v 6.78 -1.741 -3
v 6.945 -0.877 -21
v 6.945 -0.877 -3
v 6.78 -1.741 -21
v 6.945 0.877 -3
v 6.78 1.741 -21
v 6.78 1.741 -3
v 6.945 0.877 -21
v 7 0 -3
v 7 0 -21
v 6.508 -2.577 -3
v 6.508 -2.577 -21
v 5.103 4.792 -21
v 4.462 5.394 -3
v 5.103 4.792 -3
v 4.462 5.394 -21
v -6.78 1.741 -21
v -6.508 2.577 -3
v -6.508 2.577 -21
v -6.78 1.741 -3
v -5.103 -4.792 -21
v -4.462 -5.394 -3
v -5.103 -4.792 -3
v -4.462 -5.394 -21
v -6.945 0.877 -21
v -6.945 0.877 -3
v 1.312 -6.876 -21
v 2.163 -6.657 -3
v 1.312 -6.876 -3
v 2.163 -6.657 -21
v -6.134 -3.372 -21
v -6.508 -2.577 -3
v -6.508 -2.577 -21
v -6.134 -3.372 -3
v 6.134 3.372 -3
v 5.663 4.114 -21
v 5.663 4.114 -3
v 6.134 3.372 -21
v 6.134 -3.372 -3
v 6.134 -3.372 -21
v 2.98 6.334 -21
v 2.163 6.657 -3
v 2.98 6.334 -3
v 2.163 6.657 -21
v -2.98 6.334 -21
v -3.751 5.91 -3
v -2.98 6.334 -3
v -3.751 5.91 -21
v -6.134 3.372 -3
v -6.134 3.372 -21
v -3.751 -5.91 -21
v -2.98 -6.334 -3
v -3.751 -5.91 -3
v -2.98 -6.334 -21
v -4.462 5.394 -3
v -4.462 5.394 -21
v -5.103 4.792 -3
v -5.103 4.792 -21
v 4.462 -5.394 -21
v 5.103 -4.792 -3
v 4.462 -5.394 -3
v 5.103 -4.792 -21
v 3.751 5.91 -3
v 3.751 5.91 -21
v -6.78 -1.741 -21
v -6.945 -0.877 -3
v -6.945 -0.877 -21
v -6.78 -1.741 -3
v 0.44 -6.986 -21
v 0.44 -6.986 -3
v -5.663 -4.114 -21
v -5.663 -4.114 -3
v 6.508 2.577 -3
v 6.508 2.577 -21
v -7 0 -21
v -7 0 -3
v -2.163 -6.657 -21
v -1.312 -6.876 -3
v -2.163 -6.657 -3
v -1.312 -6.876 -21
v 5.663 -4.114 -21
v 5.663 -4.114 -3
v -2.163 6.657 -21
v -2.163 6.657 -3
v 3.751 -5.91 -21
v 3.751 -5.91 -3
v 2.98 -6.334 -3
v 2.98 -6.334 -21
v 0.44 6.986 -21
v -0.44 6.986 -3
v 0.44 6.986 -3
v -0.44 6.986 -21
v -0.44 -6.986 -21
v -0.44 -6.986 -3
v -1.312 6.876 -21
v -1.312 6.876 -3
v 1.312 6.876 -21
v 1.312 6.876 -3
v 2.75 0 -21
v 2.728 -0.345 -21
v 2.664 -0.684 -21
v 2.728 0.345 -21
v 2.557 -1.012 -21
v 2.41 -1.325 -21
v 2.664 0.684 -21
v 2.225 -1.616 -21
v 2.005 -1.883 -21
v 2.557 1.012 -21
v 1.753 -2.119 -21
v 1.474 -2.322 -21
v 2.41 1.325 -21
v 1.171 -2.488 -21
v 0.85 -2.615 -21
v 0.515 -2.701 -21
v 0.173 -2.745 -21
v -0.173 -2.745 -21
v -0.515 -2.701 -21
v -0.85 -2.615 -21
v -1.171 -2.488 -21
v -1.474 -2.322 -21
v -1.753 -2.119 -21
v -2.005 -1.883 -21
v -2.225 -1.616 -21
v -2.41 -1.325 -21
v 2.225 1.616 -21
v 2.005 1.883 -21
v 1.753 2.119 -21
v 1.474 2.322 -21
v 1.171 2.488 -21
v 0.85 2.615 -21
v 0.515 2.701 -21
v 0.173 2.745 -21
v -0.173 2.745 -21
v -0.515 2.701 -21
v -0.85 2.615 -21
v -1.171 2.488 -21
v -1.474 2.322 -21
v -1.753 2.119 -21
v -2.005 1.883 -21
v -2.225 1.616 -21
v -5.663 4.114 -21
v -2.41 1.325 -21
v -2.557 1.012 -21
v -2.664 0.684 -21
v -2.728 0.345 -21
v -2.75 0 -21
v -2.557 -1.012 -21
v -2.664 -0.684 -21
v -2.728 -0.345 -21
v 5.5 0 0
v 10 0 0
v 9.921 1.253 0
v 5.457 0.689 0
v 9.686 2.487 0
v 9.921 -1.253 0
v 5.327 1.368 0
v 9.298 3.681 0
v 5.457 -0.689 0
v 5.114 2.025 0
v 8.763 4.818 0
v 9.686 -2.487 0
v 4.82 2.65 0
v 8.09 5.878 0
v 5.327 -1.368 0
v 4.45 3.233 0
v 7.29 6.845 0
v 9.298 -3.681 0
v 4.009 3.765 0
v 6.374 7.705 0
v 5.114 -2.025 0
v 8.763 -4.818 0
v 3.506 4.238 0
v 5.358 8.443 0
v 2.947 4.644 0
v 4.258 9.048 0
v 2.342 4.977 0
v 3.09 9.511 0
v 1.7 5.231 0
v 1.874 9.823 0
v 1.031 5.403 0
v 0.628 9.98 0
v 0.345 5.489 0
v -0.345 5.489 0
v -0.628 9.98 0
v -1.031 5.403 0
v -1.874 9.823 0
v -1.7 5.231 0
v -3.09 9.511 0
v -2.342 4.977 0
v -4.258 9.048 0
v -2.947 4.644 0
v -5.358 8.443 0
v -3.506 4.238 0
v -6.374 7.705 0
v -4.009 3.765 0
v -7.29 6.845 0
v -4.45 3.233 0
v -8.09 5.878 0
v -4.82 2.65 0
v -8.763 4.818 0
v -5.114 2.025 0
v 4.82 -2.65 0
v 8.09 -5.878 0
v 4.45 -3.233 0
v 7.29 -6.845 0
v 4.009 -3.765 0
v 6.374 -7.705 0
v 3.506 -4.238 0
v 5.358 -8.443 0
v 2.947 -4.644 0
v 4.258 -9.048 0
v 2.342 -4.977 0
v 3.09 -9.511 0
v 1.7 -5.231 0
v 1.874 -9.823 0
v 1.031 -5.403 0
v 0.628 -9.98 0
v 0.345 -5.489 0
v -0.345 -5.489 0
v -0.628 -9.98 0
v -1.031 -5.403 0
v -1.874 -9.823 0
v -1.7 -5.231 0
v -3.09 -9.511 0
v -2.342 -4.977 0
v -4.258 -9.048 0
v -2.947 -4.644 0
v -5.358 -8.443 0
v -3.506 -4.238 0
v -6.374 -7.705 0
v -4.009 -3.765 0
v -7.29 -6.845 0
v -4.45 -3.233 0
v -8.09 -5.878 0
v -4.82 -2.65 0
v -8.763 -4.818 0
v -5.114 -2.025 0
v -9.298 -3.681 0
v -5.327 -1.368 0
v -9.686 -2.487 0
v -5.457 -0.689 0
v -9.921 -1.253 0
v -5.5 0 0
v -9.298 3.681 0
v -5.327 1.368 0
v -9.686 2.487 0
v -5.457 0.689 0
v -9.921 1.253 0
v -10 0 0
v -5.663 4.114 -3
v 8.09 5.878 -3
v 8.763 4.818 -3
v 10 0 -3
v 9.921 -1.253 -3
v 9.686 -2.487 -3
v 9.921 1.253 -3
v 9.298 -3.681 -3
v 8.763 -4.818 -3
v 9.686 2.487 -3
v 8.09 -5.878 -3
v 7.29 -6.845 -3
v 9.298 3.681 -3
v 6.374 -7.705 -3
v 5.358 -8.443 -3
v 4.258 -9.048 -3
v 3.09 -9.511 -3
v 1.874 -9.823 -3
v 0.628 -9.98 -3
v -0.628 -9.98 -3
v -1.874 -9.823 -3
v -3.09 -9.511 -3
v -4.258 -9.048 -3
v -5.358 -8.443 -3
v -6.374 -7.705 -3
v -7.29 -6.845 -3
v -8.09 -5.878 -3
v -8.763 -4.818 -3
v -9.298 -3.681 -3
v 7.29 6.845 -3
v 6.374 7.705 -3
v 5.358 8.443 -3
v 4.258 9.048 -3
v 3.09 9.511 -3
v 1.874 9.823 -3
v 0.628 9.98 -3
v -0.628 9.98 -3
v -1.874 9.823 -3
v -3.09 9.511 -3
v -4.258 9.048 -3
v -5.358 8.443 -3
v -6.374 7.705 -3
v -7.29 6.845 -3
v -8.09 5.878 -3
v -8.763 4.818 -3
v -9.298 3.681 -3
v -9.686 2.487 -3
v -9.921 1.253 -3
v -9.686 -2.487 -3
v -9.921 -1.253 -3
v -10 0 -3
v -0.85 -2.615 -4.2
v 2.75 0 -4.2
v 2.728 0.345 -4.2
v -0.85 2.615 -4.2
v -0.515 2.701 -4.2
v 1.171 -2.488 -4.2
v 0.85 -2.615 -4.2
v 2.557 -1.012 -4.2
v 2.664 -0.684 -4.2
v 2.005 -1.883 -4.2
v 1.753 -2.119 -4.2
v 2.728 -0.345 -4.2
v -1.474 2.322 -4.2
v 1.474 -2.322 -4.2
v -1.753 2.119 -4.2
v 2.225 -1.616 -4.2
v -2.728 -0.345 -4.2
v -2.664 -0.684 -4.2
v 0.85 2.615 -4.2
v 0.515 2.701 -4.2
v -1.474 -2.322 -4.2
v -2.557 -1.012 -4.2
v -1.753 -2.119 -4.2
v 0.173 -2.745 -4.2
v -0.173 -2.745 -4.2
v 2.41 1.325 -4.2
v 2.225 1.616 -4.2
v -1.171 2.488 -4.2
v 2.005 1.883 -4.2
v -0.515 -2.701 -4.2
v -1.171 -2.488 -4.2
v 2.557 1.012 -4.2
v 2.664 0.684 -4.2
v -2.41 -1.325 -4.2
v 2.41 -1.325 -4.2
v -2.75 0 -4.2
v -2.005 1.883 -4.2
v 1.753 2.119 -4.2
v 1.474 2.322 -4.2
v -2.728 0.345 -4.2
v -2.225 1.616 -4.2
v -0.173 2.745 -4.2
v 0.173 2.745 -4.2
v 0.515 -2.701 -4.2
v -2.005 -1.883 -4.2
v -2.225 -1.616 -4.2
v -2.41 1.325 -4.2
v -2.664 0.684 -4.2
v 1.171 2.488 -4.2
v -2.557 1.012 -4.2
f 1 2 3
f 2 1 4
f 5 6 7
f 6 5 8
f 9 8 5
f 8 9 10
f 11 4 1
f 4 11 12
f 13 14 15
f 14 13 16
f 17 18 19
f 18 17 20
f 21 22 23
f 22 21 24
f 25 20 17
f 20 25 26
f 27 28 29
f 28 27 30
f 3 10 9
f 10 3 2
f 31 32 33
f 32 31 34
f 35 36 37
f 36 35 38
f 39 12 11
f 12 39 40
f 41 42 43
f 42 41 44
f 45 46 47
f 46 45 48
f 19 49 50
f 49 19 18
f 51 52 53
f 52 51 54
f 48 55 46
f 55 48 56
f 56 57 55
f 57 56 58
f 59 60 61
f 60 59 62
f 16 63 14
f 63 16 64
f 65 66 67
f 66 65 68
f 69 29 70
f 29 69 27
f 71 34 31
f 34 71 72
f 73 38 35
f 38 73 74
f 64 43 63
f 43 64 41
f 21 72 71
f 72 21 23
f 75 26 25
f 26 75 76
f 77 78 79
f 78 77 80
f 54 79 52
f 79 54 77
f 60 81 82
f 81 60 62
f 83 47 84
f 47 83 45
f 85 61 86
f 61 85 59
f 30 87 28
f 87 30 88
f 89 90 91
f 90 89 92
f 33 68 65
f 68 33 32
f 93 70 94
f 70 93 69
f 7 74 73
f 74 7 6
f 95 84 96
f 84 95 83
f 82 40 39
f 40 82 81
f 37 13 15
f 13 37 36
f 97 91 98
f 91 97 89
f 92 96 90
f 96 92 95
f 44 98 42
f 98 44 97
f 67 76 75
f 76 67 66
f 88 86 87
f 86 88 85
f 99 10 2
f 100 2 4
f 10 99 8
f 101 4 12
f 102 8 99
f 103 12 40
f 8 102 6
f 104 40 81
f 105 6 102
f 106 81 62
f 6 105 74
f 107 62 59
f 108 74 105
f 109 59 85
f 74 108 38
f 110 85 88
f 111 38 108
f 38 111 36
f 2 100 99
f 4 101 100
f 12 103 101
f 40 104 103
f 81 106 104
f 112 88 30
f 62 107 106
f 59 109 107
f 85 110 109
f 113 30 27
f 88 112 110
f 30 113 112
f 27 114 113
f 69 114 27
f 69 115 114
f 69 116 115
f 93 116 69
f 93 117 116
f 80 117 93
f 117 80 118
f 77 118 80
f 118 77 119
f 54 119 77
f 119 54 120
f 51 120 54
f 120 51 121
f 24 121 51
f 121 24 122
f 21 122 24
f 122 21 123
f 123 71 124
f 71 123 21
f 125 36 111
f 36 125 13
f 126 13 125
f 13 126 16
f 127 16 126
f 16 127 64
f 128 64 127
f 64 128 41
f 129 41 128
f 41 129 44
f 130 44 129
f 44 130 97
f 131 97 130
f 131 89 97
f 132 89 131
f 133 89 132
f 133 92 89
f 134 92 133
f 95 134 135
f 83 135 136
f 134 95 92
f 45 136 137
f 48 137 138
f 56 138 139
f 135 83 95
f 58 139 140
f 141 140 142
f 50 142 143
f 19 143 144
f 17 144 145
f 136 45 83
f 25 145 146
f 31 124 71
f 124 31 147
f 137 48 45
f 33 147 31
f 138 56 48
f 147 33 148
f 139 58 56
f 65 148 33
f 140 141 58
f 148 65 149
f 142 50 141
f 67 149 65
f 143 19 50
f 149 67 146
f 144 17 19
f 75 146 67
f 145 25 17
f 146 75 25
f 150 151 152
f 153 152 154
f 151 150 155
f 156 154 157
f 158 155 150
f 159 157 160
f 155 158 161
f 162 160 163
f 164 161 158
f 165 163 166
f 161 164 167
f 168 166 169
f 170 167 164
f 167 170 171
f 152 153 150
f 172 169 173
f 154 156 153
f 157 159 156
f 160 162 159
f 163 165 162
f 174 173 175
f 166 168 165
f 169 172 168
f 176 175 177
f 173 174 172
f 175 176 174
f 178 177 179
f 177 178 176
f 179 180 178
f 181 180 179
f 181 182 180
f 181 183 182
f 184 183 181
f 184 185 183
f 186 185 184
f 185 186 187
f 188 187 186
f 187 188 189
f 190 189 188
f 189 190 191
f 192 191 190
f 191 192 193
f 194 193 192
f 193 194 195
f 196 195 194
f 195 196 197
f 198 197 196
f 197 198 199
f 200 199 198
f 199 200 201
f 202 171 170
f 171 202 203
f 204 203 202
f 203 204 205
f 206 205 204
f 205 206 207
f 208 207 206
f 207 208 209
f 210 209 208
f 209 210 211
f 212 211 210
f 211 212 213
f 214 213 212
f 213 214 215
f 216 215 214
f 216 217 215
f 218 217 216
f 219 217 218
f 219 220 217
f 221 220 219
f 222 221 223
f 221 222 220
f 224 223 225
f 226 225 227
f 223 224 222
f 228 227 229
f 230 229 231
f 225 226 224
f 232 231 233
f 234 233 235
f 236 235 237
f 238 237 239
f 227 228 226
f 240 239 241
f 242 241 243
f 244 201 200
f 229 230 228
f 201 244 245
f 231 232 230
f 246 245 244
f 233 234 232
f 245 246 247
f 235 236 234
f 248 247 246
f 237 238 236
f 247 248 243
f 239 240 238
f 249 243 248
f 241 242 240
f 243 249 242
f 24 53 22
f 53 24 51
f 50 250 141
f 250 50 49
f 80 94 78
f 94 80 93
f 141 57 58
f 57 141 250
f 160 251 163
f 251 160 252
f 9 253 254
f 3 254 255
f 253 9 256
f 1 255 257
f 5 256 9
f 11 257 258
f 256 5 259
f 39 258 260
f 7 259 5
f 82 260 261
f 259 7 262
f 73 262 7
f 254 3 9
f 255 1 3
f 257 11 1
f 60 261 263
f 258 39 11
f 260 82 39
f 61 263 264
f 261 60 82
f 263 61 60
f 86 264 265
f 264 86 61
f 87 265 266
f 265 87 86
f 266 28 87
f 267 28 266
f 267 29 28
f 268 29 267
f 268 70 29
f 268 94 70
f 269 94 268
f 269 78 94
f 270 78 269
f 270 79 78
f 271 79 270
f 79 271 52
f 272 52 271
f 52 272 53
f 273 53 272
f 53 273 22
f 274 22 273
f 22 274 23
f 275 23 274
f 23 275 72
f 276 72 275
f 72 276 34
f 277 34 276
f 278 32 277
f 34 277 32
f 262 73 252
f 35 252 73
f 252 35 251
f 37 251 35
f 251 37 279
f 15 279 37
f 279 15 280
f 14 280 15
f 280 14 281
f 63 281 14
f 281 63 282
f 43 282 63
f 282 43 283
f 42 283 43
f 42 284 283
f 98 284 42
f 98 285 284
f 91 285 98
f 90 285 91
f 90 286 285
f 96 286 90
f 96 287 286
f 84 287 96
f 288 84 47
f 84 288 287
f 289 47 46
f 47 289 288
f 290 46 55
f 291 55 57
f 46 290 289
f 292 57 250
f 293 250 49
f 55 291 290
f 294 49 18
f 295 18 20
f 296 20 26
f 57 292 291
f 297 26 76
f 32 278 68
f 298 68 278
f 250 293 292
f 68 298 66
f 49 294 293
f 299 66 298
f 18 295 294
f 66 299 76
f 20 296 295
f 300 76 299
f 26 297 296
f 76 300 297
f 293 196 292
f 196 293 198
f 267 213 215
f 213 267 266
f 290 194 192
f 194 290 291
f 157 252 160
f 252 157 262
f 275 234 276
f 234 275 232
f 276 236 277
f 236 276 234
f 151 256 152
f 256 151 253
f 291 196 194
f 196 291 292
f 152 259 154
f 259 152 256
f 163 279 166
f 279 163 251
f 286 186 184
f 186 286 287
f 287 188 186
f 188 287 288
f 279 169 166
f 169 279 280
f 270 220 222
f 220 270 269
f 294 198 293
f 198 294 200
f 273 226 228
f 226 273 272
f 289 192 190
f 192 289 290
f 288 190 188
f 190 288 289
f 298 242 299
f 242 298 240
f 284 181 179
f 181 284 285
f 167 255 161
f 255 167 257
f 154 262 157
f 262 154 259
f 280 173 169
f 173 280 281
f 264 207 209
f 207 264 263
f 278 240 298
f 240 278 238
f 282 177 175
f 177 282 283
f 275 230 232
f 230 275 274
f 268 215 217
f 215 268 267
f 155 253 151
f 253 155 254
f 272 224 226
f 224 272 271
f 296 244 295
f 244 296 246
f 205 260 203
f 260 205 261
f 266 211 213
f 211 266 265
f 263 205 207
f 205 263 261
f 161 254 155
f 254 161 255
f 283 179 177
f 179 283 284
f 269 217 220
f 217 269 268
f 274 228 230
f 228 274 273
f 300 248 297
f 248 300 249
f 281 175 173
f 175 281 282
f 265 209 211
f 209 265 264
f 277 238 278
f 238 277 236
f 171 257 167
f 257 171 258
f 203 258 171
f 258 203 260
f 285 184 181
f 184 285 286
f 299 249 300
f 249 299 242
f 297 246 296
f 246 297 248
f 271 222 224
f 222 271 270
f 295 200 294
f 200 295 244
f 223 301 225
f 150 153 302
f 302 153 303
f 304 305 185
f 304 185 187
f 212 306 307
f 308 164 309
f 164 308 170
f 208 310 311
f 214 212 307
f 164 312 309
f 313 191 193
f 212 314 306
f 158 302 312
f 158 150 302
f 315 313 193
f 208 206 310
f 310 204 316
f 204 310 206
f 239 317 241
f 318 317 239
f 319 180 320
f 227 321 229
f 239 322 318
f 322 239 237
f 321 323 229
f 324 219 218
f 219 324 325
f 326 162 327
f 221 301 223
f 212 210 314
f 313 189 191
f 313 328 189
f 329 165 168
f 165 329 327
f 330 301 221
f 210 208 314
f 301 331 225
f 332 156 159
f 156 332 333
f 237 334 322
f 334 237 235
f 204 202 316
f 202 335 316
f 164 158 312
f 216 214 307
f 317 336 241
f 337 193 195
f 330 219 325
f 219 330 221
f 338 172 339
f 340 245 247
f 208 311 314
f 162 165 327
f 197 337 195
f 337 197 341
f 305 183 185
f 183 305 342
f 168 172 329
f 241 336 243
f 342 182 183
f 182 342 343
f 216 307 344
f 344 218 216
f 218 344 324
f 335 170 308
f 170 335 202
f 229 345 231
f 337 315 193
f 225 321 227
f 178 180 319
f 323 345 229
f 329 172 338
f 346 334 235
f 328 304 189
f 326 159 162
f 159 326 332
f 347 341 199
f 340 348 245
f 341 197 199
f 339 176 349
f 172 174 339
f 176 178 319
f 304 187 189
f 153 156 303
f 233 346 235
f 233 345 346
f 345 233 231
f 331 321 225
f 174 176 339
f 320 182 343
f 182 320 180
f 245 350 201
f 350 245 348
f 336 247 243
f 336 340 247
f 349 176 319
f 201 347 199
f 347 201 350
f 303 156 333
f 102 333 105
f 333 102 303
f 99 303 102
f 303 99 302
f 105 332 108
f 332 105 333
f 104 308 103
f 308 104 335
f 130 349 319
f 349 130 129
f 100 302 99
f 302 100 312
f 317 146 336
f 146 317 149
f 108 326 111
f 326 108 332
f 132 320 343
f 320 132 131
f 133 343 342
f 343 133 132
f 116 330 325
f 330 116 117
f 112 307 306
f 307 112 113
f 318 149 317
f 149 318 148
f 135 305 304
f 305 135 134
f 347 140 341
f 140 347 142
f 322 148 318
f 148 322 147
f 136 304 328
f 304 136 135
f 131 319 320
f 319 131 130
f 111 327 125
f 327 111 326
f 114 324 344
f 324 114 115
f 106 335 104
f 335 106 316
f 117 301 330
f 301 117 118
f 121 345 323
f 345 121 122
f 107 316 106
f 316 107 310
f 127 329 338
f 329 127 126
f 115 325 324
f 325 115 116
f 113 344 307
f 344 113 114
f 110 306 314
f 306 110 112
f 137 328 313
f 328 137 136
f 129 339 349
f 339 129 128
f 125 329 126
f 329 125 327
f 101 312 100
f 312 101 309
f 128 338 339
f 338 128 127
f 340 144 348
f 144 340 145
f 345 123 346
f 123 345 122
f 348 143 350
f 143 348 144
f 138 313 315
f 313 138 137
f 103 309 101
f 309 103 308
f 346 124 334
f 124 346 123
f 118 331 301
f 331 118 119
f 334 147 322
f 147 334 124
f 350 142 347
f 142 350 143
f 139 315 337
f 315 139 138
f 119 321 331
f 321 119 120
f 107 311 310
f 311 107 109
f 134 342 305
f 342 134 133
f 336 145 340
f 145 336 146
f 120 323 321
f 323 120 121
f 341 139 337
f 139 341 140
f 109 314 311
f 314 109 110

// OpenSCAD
$fn = 50;


difference() {
	union() {
		translate(v = [0, 0, -21.0000000000]) {
			cylinder(h = 21, r = 7.0000000000);
		}
		translate(v = [0, 0, -3.0000000000]) {
			cylinder(h = 3, r = 10.0000000000);
		}
	}
	union() {
		translate(v = [0, 0, 0]) {
			rotate(a = [0, 0, 0]) {
				difference() {
					union() {
						#translate(v = [0, 0, -21.0000000000]) {
							cylinder(h = 21, r = 2.2500000000);
						}
						#translate(v = [0, 0, -4.2000000000]) {
							cylinder(h = 4.2000000000, r1 = 2.7500000000, r2 = 5.5000000000);
						}
						#translate(v = [0, 0, -21.0000000000]) {
							cylinder(h = 21, r = 2.7500000000);
						}
						#translate(v = [0, 0, -21.0000000000]) {
							cylinder(h = 21, r = 2.2500000000);
						}
					}
					union();
				}
			}
		}
	}
}
